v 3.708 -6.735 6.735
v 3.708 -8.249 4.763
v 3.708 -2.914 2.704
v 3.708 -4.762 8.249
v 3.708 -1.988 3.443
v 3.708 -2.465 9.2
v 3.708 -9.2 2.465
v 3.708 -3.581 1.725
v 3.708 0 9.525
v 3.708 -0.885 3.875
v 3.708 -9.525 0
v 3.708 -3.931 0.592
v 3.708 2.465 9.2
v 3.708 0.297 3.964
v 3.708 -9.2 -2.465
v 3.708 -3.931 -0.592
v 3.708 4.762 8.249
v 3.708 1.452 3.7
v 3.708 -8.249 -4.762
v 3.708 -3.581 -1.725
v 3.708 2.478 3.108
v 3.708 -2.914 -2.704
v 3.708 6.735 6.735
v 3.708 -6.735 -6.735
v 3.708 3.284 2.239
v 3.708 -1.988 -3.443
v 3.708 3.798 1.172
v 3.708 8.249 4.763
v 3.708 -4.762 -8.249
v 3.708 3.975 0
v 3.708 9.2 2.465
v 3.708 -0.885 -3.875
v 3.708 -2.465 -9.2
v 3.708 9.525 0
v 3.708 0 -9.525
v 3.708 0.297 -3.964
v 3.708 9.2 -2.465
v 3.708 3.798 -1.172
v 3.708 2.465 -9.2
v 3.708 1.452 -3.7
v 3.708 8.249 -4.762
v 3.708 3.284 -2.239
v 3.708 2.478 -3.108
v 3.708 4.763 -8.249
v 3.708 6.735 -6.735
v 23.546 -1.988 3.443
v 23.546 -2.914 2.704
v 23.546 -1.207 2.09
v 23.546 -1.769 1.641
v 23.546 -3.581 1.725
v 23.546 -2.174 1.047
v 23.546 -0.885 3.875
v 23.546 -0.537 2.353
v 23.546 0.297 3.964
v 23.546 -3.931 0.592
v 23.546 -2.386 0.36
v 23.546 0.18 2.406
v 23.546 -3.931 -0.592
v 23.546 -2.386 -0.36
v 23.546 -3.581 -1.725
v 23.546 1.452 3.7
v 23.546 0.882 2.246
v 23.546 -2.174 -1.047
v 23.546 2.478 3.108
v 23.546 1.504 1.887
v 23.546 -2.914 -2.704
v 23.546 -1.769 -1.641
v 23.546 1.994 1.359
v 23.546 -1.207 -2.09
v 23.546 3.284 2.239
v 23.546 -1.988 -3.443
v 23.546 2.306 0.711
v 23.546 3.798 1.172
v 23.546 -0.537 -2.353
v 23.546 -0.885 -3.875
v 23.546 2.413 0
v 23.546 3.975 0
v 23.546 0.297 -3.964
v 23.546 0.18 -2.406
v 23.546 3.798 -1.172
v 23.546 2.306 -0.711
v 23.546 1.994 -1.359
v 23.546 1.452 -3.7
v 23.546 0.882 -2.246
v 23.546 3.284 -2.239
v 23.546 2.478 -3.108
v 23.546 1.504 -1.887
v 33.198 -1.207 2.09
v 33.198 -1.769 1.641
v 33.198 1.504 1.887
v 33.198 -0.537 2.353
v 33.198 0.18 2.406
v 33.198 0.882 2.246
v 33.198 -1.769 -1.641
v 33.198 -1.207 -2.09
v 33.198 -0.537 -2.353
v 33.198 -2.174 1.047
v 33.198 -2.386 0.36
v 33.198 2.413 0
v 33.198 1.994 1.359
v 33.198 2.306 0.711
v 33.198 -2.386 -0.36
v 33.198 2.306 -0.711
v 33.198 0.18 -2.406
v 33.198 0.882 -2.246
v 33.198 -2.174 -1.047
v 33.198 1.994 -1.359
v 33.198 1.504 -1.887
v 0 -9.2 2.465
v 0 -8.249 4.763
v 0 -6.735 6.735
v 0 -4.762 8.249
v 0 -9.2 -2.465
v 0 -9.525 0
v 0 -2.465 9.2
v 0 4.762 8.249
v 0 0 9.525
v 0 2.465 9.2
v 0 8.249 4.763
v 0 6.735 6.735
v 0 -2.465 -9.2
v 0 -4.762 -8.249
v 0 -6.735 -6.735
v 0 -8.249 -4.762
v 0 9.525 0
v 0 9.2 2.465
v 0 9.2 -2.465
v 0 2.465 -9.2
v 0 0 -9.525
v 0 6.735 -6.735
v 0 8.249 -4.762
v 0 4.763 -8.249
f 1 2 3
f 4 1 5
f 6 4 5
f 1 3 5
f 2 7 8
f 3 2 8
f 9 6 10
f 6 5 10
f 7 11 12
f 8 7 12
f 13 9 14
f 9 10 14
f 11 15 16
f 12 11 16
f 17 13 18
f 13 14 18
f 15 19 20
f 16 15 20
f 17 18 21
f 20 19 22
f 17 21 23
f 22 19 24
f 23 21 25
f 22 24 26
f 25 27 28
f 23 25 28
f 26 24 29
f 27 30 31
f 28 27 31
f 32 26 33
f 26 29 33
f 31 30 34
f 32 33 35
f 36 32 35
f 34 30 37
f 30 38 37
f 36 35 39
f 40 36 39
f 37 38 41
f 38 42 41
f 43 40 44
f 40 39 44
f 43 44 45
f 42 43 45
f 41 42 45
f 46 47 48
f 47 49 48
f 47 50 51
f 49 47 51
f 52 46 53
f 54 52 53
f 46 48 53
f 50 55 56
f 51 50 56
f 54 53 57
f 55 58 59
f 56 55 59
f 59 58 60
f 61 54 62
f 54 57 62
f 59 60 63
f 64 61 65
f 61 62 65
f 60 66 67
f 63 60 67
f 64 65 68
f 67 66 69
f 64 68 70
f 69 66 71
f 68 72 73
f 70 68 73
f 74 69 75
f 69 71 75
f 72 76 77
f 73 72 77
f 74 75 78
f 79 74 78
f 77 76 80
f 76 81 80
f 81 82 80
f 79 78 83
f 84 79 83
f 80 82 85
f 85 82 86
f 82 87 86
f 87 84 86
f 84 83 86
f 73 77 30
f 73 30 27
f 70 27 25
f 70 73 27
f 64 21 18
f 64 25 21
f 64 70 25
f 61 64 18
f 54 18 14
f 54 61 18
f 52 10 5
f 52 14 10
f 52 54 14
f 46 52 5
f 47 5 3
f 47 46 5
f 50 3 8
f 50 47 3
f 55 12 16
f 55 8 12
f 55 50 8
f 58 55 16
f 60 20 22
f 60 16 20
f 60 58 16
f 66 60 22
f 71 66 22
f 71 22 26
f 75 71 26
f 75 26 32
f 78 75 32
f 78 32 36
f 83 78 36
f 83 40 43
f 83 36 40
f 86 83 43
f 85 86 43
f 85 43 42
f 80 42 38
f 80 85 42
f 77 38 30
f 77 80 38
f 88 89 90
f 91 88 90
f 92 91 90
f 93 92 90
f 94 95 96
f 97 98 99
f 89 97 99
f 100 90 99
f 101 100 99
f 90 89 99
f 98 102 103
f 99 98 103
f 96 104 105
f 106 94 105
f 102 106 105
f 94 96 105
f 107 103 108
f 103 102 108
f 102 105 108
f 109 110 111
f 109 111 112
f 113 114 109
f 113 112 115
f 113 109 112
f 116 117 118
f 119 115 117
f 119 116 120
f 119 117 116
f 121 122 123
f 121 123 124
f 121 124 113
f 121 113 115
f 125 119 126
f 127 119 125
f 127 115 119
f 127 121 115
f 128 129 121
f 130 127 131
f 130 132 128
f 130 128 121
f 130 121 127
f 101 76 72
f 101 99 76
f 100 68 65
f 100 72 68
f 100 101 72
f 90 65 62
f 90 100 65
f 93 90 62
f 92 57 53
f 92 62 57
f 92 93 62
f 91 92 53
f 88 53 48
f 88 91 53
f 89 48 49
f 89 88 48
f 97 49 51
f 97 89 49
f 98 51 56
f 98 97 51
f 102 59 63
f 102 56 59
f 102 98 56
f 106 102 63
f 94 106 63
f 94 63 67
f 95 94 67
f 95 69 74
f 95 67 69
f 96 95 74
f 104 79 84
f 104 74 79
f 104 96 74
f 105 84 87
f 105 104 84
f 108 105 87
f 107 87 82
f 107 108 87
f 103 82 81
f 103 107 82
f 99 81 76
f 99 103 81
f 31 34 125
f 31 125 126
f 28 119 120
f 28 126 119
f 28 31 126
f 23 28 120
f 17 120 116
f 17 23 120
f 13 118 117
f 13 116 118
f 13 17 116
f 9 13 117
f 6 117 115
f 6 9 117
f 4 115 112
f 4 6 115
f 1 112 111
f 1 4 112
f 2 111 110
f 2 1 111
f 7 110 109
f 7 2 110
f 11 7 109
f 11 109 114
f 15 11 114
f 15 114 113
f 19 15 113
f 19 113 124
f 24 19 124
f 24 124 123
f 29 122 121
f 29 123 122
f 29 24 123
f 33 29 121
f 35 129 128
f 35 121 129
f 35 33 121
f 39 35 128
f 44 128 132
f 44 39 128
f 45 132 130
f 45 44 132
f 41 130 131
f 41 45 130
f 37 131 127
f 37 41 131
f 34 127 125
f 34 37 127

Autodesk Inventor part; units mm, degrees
ref_plane "YZ Plane" through (0, 0, 0) normal (1, 0, 0) x (0, 1, 0)
ref_plane "XZ Plane" through (0, 0, 0) normal (0, 1, 0) x (-1, 0, 0)
ref_plane "XY Plane" through (0, 0, 0) normal (0, 0, 1) x (1, 0, 0)
sketch "Sketch1" plane through (0, 0, 0) normal (0, 0, 1) x (1, 0, 0)
  line L0 (0, 0) -> (0, 9.525)
  line L1 (0, 9.525) -> (3.7084, 9.525)
  line L2 (3.7084, 9.525) -> (3.7084, 3.9751)
  line L3 (3.7084, 3.9751) -> (23.5458, 3.9751)
  line L4 (23.5458, 3.9751) -> (23.5458, 2.413)
  line L5 (23.5458, 2.413) -> (33.1978, 2.413)
  line L6 (33.1978, 2.413) -> (33.1978, 0)
  line L7 (33.1978, 0) -> (0, 0)
  dimension "d0" = 9.525
  dimension "d1" = 3.9751
  dimension "d2" = 3.7084
  dimension "d3" = 9.652
  dimension "d4" = 33.1978
  dimension "d5" = 2.413
revolve "Revolution1" add sketch "Sketch1" angle 360 about axis through (33.1978, 0, 0) along (-1, 0, 0)
thread "Thread1" size "10-24 UNC" class "2A" standard "ANSI Unified Screw Threads" full length
properties part number "Pancake Shifter Shaft"
